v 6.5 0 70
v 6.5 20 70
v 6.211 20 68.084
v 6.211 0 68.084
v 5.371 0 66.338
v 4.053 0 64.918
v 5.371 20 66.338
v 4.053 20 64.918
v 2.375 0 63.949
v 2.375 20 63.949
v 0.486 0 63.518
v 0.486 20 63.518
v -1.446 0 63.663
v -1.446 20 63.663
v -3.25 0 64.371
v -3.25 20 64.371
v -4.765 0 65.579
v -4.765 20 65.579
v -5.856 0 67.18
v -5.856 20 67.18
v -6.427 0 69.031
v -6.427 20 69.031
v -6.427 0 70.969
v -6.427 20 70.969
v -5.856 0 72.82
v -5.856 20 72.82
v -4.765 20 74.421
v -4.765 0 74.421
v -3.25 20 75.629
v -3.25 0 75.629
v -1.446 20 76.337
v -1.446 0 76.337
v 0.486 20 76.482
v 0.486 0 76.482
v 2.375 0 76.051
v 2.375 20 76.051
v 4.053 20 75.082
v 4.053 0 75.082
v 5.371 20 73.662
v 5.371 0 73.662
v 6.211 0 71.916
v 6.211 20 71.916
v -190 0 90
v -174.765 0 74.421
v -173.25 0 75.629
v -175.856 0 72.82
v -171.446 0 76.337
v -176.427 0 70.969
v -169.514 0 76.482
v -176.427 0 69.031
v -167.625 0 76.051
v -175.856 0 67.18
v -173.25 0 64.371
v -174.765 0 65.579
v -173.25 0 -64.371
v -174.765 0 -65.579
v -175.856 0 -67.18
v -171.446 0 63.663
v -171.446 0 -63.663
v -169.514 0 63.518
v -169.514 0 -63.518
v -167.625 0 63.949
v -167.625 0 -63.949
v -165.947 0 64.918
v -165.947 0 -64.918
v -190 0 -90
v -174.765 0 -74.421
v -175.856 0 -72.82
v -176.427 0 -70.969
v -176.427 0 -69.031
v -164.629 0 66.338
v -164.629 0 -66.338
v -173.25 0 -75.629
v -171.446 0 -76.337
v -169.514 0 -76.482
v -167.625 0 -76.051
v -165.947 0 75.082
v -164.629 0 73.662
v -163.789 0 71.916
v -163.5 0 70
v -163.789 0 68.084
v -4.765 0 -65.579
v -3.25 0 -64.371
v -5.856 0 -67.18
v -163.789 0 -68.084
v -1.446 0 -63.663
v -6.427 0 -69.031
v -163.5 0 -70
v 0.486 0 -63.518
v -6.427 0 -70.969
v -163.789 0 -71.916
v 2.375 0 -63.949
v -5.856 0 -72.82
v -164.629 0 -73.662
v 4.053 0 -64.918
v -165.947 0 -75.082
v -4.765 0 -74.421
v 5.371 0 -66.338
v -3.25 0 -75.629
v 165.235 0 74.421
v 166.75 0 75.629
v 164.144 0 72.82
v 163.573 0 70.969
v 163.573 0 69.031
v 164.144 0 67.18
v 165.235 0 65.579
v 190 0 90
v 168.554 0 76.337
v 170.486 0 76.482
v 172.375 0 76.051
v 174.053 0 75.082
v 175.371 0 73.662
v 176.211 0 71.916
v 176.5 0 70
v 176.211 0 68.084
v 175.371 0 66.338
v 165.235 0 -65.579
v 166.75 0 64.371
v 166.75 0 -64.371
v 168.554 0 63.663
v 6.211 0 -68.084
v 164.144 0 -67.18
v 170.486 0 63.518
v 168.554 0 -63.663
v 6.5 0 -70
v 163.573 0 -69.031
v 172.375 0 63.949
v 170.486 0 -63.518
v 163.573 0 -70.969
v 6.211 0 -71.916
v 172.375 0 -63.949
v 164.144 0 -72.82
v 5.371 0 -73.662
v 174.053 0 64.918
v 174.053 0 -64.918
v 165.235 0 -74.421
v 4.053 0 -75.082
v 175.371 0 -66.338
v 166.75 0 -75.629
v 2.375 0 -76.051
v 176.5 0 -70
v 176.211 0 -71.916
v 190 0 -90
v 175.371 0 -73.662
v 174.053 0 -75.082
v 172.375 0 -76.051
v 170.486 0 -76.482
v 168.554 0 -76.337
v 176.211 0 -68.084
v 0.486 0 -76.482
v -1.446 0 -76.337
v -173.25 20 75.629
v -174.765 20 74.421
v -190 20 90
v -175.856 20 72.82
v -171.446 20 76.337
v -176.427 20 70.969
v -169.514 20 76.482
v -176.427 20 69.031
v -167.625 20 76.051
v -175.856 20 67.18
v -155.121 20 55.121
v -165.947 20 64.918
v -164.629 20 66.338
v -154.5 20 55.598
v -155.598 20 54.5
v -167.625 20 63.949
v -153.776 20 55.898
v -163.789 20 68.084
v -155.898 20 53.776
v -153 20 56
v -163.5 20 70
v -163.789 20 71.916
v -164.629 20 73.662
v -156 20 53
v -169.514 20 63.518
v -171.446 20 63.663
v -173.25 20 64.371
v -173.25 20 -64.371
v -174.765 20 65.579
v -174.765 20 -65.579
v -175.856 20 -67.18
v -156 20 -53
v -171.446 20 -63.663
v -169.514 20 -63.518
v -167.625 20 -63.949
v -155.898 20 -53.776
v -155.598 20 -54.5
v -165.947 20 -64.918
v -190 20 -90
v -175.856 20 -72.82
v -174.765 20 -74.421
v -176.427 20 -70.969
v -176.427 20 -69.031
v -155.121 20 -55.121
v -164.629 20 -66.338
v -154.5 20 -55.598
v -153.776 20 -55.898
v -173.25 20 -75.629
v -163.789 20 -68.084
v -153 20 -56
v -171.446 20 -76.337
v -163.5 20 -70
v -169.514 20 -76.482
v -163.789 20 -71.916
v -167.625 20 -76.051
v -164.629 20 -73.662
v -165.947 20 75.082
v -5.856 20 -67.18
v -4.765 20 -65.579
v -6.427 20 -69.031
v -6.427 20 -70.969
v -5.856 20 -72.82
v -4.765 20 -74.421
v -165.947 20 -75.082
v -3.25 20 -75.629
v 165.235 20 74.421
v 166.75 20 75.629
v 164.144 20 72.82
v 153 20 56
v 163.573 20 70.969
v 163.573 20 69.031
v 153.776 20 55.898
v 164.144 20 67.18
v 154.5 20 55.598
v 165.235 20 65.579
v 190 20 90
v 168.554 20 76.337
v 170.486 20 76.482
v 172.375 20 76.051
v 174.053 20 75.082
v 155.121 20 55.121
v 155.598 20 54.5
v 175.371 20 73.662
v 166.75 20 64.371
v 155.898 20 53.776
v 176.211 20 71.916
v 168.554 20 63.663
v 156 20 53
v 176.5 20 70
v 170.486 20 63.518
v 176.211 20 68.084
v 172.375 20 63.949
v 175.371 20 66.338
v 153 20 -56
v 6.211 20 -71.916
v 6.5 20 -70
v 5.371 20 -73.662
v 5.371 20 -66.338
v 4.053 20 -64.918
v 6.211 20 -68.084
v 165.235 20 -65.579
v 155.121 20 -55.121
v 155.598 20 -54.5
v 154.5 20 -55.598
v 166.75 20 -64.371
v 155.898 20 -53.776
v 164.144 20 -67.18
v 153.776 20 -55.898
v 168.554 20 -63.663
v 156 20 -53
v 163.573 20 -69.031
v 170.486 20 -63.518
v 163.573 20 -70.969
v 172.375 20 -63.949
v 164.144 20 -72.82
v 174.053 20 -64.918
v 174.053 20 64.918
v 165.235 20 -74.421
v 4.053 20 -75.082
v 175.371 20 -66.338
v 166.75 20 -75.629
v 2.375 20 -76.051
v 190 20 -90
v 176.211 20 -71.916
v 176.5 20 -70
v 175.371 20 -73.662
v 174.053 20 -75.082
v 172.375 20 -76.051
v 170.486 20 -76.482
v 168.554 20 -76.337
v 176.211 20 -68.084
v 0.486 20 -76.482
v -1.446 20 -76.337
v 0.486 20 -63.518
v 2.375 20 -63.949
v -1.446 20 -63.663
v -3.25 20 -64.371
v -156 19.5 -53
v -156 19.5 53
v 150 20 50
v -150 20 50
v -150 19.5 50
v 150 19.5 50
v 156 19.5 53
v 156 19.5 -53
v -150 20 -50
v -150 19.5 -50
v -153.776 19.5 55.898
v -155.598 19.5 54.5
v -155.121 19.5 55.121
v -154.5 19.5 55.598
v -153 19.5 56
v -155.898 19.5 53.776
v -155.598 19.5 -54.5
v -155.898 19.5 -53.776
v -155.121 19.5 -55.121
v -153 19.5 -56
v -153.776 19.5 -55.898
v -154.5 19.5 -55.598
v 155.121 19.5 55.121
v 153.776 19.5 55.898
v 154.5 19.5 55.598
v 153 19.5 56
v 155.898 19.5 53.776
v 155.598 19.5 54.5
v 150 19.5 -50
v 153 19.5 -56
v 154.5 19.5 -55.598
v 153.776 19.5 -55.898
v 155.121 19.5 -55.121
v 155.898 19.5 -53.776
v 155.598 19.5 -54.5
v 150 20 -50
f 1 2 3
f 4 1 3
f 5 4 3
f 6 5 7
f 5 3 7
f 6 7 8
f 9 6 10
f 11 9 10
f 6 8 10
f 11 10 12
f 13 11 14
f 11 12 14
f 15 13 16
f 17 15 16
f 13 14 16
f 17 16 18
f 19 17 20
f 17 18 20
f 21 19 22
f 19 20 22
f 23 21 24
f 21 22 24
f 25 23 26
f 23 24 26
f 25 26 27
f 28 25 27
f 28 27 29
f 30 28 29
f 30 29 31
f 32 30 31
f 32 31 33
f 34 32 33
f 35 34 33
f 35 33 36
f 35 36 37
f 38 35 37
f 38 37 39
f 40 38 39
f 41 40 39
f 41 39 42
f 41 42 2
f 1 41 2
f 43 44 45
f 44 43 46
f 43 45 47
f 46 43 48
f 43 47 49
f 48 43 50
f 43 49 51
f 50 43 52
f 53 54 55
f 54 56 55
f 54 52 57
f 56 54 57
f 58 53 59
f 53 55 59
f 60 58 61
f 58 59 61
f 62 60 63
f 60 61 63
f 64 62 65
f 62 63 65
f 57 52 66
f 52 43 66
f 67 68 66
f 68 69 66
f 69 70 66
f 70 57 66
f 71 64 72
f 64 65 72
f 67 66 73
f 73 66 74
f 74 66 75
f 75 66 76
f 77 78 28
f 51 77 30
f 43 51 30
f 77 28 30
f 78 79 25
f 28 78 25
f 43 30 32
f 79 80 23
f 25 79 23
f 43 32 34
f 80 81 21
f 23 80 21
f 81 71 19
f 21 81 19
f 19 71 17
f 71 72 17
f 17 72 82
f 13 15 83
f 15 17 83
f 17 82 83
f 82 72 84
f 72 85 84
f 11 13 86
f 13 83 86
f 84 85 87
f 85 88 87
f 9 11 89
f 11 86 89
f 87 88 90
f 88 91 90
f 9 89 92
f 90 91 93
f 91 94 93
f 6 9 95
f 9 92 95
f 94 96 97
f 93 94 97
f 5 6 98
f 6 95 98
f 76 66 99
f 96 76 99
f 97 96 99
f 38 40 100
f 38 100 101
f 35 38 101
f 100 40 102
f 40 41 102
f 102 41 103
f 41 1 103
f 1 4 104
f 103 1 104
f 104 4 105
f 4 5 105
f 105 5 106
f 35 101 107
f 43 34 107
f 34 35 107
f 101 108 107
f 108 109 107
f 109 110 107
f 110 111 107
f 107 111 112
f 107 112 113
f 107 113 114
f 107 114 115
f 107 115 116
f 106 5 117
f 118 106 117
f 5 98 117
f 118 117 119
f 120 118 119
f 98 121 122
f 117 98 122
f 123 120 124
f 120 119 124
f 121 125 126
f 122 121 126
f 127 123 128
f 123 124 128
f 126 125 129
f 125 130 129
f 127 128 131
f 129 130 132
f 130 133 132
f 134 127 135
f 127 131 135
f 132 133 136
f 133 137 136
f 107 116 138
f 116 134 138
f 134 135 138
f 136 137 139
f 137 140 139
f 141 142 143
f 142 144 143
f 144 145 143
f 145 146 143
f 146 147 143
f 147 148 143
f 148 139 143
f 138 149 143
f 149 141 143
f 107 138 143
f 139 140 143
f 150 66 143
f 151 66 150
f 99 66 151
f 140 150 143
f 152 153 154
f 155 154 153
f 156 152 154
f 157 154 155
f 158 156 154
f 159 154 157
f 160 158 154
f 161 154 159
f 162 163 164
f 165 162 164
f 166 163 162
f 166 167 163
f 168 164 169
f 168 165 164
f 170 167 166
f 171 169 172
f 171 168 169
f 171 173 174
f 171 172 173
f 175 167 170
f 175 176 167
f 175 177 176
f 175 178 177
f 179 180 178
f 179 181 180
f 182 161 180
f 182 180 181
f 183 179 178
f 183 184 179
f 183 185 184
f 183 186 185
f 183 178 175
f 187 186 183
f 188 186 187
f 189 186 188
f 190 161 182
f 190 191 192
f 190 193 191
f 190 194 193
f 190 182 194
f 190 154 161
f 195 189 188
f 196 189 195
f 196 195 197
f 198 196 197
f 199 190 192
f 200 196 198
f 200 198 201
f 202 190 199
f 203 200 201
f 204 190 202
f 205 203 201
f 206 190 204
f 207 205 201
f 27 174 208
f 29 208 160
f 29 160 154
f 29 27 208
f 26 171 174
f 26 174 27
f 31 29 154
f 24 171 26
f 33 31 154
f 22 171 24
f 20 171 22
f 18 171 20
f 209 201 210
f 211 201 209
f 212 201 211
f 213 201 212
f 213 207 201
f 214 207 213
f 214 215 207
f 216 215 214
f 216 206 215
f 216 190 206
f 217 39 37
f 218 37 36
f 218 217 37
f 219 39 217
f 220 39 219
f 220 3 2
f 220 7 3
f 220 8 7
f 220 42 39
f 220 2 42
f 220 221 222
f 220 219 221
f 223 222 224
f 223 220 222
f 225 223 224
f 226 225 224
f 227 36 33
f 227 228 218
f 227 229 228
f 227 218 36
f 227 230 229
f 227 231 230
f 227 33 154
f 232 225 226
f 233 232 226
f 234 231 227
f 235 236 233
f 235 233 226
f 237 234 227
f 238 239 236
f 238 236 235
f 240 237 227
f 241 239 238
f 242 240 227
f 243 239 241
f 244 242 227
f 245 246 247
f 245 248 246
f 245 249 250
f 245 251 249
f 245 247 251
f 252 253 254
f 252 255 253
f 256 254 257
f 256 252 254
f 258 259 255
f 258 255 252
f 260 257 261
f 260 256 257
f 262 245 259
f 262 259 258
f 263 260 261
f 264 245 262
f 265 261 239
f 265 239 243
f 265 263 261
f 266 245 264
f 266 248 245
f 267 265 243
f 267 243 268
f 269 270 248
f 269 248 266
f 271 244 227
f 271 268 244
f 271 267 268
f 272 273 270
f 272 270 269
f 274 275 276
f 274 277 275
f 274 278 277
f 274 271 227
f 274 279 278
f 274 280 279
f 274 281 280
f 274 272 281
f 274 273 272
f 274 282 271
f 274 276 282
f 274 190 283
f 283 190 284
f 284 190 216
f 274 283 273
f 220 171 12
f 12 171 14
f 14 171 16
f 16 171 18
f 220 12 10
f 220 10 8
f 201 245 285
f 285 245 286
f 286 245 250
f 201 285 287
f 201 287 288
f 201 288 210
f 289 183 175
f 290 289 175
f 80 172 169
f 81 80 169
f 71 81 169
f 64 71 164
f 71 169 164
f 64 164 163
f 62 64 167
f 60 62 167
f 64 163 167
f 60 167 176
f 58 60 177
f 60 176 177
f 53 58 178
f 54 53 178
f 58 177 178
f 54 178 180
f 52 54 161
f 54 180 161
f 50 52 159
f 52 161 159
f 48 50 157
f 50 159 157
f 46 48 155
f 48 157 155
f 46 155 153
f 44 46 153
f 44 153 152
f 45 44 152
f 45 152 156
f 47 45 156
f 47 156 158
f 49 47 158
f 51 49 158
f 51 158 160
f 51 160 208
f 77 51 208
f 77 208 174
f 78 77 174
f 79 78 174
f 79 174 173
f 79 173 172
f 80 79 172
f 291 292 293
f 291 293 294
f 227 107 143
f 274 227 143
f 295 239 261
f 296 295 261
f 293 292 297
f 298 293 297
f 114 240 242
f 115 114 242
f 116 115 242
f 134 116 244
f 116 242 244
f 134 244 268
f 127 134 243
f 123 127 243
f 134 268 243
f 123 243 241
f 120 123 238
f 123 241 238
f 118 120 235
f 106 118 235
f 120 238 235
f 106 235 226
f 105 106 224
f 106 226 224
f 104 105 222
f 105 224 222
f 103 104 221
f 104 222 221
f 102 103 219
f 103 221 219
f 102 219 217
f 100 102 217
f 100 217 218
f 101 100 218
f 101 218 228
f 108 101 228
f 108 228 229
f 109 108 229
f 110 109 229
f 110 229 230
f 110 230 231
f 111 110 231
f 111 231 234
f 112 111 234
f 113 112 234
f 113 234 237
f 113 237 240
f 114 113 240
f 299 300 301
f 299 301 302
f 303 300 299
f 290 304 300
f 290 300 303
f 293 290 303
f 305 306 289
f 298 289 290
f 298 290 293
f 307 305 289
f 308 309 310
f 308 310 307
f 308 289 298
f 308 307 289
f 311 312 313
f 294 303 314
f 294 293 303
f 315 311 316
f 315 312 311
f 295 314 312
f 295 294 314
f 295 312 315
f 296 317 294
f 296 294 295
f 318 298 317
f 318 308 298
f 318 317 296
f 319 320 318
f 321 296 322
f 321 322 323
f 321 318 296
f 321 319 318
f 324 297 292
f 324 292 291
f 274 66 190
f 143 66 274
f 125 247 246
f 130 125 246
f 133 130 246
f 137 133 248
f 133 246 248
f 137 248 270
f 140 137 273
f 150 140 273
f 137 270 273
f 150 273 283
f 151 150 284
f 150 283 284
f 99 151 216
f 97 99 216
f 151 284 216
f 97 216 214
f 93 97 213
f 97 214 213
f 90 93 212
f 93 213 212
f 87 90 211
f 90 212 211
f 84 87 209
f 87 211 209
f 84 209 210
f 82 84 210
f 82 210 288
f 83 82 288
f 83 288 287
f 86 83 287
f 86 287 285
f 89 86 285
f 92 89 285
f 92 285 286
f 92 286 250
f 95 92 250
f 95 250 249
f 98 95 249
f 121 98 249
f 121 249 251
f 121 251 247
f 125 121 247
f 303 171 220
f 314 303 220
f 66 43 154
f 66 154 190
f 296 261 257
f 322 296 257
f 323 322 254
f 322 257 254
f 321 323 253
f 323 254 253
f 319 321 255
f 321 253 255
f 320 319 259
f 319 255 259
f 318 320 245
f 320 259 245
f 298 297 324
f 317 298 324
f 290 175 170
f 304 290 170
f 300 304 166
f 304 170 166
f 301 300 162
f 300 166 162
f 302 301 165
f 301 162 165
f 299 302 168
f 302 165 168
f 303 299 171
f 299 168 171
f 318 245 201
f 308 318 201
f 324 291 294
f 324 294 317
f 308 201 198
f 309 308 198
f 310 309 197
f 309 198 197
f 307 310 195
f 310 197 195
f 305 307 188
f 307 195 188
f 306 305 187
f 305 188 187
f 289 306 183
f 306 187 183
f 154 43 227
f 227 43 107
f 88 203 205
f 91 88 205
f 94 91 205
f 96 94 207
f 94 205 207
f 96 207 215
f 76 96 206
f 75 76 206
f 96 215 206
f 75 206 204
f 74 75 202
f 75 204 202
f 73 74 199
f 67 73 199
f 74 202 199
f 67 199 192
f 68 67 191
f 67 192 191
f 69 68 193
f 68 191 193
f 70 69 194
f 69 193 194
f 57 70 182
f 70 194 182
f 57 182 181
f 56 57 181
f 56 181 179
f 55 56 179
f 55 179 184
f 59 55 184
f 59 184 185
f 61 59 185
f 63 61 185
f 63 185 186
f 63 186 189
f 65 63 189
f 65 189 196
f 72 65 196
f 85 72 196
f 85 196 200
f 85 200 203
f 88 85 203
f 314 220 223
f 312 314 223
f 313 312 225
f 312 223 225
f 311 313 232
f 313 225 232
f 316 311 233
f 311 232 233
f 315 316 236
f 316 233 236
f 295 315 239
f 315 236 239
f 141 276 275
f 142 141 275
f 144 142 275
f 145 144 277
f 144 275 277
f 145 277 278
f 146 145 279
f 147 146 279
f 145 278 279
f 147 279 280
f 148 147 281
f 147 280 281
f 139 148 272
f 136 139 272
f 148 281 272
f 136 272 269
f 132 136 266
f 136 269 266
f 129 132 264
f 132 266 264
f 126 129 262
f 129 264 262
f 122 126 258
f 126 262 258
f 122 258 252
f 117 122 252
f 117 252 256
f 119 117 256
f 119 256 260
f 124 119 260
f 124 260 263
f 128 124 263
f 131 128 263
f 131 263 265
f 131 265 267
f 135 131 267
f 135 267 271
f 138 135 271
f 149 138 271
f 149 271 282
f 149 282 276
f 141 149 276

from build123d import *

# Parameters (mm, degrees)
SKETCH1_W           = 380
SKETCH1_H           = 180
BOSS_EXTRUDE1_DEPTH = 20
SKETCH2_R           = 6.5
CUT_EXTRUDE1_DEPTH  = 21
SKETCH3_W           = 300
SKETCH3_H           = 100
CUT_EXTRUDE2_DEPTH  = 0.5


with BuildPart() as part:
    # Sketch1 → Boss-Extrude1 (new body)
    with BuildSketch(Plane(origin=(0, 0, 0), x_dir=(1, 0, 0), z_dir=(0, 1, 0))):
        Rectangle(SKETCH1_W, SKETCH1_H)
    extrude(amount=BOSS_EXTRUDE1_DEPTH)

    # Sketch2 → Cut-Extrude1 (cut, through all)
    with BuildSketch(Plane(origin=(0, 20, 0), x_dir=(1, 0, 0), z_dir=(0, 1, 0))):
        with Locations((-170, 70)):
            Circle(SKETCH2_R)
        with Locations((-170, -70)):
            Circle(SKETCH2_R)
        with Locations((0, -70)):
            Circle(SKETCH2_R)
        with Locations((0, 70)):
            Circle(SKETCH2_R)
        with Locations((170, -70)):
            Circle(SKETCH2_R)
        with Locations((170, 70)):
            Circle(SKETCH2_R)
    extrude(amount=-CUT_EXTRUDE1_DEPTH, mode=Mode.SUBTRACT)

    # Sketch3 → Cut-Extrude2 (cut)
    with BuildSketch(Plane(origin=(0, 20, 0), x_dir=(1, 0, 0), z_dir=(0, 1, 0))):
        with BuildLine():
            Line((-153, -56), (153, -56))
            ThreePointArc((153, -56), (155.121320344, -55.121320344), (156, -53))
            Line((156, -53), (156, 53))
            ThreePointArc((156, 53), (155.121320344, 55.121320344), (153, 56))
            Line((153, 56), (-153, 56))
            ThreePointArc((-153, 56), (-155.121320344, 55.121320344), (-156, 53))
            Line((-156, 53), (-156, -53))
            ThreePointArc((-156, -53), (-155.121320344, -55.121320344), (-153, -56))
        make_face()
        Rectangle(SKETCH3_W, SKETCH3_H, mode=Mode.SUBTRACT)
    extrude(amount=-CUT_EXTRUDE2_DEPTH, mode=Mode.SUBTRACT)


solid = part.part
